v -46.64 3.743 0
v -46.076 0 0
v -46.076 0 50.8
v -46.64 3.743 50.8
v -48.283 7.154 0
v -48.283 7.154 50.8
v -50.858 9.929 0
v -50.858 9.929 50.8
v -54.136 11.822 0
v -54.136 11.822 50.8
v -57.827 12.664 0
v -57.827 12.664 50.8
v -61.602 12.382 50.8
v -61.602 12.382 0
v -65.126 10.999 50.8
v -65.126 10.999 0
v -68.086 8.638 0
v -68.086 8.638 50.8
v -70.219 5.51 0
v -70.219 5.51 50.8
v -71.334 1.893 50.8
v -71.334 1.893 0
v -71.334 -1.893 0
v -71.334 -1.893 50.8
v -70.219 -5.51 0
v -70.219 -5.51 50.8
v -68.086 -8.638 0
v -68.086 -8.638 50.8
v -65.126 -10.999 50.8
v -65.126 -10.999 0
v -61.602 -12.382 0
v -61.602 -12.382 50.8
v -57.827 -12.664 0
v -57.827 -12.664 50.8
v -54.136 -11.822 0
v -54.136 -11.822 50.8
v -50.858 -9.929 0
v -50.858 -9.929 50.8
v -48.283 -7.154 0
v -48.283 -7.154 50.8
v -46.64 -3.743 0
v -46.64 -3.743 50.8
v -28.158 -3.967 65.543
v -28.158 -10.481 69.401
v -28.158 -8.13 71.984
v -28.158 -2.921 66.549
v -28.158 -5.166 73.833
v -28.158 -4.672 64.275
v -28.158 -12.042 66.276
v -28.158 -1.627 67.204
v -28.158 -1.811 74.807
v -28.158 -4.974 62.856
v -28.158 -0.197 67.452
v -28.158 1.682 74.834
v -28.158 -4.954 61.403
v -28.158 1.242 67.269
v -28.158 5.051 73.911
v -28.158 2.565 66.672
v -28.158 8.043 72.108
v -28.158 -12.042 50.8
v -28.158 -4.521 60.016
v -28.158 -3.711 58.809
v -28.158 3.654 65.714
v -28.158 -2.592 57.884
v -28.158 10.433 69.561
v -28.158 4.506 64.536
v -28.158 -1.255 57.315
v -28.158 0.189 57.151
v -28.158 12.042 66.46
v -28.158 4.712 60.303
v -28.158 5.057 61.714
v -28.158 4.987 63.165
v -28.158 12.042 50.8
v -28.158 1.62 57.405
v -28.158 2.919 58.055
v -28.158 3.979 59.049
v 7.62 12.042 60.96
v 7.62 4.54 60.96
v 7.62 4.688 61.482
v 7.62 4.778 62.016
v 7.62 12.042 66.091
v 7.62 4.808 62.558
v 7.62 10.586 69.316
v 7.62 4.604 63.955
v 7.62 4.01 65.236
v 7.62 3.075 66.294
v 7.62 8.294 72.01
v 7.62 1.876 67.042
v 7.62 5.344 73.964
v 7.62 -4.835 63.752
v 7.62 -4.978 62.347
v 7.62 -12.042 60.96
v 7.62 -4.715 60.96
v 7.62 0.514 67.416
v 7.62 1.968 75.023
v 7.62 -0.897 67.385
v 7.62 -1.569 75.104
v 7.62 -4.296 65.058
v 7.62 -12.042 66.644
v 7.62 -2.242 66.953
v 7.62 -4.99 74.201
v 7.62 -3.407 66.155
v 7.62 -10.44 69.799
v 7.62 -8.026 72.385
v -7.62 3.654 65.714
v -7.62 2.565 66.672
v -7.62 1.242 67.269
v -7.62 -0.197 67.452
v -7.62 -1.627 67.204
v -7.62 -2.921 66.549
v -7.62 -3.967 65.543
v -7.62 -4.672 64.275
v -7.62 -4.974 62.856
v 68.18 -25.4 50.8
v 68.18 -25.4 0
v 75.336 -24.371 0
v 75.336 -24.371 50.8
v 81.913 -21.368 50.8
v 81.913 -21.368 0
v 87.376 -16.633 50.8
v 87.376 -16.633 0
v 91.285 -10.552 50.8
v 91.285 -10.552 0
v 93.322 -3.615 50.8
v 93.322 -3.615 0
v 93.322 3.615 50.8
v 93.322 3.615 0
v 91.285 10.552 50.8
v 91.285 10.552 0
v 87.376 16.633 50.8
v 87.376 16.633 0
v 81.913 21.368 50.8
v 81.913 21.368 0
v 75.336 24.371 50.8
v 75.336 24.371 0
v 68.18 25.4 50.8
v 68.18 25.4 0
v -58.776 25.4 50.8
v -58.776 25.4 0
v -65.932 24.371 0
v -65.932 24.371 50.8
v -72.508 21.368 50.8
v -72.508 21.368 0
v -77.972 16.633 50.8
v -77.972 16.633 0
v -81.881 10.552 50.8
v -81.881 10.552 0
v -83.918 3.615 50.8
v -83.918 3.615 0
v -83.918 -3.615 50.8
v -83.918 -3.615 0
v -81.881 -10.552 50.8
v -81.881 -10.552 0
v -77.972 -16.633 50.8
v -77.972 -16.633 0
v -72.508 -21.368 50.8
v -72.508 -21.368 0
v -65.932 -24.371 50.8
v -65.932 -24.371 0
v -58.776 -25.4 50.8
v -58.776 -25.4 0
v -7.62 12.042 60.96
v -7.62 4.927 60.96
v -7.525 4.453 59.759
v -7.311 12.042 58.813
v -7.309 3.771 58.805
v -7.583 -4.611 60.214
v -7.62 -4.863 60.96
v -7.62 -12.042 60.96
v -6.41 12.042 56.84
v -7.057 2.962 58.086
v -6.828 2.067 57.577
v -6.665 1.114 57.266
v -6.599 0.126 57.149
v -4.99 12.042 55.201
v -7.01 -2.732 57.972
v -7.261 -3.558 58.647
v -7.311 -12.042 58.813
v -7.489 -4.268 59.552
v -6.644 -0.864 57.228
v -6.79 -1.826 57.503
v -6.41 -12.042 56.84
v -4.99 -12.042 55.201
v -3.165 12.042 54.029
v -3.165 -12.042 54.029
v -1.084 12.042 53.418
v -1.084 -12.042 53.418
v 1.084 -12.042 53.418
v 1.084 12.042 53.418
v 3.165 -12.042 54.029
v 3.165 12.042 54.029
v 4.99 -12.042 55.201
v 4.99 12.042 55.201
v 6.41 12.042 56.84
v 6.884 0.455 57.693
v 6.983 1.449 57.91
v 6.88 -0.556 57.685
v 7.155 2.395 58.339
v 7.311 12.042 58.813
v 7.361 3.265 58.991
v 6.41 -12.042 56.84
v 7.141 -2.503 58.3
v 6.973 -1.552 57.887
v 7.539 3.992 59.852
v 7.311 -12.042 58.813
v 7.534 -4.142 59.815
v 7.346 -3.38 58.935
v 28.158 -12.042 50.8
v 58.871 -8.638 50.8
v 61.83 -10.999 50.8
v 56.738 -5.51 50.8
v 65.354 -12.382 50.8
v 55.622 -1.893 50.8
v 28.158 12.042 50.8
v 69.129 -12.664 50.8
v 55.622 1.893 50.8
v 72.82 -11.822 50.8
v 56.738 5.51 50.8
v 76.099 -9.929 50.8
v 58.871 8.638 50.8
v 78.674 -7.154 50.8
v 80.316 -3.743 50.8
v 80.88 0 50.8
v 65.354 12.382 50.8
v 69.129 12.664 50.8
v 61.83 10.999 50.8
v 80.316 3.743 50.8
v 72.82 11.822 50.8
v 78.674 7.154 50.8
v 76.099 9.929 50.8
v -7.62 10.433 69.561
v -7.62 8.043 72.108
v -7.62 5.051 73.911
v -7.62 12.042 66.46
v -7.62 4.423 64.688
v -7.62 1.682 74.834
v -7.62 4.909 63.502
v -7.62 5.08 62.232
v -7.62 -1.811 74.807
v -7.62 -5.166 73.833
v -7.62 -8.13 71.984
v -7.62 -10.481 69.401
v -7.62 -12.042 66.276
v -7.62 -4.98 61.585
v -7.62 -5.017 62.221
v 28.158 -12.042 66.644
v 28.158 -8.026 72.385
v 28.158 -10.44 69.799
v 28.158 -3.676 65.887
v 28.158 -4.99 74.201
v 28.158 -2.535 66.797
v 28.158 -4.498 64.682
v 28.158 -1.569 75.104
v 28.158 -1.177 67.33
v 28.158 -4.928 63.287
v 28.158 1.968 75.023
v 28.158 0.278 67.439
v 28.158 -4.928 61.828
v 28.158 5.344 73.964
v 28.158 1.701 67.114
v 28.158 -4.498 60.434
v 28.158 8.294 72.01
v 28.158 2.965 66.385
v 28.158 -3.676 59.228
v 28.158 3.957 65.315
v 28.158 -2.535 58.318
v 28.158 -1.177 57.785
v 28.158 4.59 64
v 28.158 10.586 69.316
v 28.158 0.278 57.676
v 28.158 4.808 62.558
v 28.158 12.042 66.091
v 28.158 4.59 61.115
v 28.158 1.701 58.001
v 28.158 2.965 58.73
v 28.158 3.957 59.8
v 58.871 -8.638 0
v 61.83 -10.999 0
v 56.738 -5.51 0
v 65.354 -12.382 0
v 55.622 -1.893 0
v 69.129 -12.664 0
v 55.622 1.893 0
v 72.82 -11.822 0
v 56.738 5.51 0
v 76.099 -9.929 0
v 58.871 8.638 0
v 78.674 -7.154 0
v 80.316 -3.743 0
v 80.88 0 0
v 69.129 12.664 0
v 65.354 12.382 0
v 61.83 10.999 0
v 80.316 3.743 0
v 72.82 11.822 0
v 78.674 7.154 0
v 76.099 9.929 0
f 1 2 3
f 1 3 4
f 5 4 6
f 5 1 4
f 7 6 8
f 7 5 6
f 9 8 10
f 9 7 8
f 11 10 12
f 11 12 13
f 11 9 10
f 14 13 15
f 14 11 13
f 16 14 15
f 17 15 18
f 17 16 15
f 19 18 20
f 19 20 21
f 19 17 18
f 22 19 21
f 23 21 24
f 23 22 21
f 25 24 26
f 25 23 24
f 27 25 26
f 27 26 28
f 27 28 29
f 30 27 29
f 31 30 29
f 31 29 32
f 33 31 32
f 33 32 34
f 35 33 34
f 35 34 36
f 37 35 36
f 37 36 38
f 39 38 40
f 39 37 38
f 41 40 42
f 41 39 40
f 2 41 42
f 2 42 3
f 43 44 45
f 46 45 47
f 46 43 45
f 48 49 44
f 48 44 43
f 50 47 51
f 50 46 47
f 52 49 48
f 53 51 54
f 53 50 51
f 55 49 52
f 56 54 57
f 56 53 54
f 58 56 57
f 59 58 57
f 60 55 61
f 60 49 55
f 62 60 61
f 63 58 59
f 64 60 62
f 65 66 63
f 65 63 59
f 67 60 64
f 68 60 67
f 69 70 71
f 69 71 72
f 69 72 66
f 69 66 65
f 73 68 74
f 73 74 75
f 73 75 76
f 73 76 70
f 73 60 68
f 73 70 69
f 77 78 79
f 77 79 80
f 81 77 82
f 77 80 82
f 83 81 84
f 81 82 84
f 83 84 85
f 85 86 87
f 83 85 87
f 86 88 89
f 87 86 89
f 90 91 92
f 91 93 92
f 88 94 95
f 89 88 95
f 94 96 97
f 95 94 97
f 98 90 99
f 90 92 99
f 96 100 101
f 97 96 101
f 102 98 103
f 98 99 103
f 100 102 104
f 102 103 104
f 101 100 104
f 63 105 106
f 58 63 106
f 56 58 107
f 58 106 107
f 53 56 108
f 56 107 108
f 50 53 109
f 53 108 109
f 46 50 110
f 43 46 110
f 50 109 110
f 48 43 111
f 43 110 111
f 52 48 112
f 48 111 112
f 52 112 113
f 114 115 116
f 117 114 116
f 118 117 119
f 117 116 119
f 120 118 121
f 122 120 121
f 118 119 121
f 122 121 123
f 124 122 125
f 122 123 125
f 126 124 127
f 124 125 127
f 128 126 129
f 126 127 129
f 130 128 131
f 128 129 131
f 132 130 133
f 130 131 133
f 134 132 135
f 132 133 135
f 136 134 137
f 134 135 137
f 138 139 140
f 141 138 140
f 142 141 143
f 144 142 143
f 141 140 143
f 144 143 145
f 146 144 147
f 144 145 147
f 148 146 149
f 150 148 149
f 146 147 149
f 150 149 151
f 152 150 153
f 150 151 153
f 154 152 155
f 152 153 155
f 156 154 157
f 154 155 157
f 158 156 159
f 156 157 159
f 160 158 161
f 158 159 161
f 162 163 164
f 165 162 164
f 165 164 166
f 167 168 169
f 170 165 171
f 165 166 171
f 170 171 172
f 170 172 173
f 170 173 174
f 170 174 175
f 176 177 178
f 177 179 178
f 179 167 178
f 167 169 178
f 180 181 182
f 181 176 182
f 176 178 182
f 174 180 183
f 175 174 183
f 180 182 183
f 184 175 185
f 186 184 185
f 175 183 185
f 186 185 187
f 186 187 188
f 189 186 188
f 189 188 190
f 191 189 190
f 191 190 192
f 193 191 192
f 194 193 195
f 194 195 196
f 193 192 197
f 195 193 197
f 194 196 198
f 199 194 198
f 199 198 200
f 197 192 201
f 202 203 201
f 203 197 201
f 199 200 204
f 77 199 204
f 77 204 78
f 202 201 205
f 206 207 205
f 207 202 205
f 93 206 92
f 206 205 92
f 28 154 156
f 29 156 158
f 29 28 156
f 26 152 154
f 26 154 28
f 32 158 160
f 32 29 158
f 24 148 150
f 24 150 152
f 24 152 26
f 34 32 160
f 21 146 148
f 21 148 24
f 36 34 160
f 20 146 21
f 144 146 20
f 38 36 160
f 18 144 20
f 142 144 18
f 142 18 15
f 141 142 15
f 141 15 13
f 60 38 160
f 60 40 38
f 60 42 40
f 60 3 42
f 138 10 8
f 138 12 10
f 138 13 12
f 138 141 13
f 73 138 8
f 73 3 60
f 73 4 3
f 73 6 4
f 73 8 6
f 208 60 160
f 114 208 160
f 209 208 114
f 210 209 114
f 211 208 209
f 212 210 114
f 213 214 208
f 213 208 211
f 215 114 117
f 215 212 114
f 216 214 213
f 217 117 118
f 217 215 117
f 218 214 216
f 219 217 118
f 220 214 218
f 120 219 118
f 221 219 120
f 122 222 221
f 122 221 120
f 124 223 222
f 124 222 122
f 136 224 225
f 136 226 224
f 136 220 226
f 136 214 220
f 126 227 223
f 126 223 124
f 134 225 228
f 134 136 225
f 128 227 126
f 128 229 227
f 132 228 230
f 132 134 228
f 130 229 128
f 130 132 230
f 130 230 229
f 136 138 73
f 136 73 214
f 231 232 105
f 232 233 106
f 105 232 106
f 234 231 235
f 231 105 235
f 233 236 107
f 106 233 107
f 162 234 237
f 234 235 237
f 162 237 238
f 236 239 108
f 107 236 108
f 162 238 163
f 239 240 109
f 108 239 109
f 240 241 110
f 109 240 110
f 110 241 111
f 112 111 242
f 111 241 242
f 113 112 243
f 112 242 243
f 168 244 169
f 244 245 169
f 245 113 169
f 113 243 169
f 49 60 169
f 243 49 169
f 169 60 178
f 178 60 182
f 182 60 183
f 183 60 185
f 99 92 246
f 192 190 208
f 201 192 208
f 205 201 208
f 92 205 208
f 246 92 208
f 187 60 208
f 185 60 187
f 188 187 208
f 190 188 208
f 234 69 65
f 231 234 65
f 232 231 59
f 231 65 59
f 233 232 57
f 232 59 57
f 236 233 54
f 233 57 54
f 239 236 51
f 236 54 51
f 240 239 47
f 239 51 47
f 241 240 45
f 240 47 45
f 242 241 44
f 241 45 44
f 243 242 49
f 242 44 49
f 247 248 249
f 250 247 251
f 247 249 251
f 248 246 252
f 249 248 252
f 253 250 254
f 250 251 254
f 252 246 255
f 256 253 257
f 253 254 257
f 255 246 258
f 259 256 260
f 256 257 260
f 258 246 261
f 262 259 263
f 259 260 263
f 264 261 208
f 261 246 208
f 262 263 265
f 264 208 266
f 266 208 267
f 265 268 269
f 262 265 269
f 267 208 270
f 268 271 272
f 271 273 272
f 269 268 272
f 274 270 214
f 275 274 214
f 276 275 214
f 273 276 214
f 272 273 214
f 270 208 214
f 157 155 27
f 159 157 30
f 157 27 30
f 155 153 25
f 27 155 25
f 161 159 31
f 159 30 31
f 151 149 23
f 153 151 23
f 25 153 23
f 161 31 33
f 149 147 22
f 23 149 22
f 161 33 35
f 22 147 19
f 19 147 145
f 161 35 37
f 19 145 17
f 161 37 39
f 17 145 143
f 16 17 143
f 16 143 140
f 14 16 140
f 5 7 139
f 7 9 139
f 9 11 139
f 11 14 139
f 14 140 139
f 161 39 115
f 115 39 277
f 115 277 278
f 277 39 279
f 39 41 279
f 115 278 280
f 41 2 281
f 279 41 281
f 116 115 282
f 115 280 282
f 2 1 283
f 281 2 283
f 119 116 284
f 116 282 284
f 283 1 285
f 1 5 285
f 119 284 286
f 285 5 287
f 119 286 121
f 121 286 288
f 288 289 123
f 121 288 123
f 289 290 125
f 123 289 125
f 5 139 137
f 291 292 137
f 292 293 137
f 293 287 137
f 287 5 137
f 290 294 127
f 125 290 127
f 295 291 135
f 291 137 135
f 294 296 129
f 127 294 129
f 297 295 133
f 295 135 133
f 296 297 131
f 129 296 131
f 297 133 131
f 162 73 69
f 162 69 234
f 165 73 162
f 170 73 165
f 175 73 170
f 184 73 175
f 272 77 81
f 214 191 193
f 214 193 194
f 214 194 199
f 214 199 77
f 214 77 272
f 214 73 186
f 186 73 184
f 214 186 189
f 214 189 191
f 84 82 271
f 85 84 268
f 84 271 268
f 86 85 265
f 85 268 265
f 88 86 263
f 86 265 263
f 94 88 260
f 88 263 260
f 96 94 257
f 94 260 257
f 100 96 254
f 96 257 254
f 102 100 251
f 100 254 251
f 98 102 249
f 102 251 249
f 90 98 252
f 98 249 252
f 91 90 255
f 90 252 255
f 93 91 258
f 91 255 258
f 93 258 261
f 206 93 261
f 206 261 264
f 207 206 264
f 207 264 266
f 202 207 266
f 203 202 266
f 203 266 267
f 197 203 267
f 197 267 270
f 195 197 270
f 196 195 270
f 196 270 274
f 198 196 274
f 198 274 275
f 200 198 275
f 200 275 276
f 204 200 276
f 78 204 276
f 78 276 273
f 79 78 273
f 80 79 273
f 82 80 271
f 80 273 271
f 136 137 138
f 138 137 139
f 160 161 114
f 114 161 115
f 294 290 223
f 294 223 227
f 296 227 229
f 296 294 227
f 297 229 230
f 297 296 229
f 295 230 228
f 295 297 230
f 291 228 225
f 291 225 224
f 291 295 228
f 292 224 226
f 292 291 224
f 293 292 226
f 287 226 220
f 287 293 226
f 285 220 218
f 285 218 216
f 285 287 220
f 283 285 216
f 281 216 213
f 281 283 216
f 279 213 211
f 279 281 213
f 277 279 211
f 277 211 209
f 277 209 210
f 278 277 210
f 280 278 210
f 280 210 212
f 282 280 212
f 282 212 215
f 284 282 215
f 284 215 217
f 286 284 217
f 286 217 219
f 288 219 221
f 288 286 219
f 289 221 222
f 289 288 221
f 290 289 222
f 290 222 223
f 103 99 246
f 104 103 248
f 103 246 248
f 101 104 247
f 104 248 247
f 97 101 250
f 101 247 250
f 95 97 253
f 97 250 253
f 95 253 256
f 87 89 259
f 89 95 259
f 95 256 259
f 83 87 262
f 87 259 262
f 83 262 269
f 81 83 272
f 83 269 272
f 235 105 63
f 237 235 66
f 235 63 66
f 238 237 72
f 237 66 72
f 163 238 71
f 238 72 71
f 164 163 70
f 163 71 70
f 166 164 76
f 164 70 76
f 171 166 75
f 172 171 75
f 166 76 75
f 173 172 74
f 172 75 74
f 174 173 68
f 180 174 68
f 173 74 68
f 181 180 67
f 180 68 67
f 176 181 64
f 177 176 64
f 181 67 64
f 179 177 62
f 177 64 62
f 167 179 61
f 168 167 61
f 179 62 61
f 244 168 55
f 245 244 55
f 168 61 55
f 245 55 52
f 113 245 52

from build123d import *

# Parameters (mm, degrees)
F0_R      = 12.7
F1_DEPTH  = 50.8
F2_W      = 56.316178
F2_H      = 24.083158
F3_DEPTH  = 25.4
F5_DEPTH  = 34.544
F8_DEPTH  = 25.4
F7_R      = 4.89521
F9_DEPTH  = 127
F6_R      = 5.04868
F10_DEPTH = 25.4


with BuildPart() as f1:
    # F0 (on Top) → F1 (new body)
    with BuildSketch(Plane.XY):
        with BuildLine():
            Line((68.180415, 25.4), (-58.776217, 25.4))
            ThreePointArc((-58.776217, 25.4), (-84.176217, 0), (-58.776217, -25.4))
            Line((-58.776217, -25.4), (68.180415, -25.4))
            ThreePointArc((68.180415, -25.4), (93.580415, 0), (68.180415, 25.4))
        make_face()
        with Locations((-58.776217, 0)):
            Circle(F0_R, mode=Mode.SUBTRACT)
        with Locations((68.180415, 0)):
            Circle(F0_R, mode=Mode.SUBTRACT)
    extrude(amount=F1_DEPTH)

    # F2 (on face) → F3 (join)
    with BuildSketch(Plane.XY.offset(50.8)):
        Rectangle(F2_W, F2_H)
    extrude(amount=F3_DEPTH)

    # F4 (on face) → F5 (cut)
    with BuildSketch(Plane.XZ.offset(12.041579)):
        with BuildLine():
            Line((-7.62, 76.2), (-7.62, 60.96))
            ThreePointArc((-7.62, 60.96), (0, 53.34), (7.62, 60.96))
            Line((7.62, 60.96), (7.62, 76.2))
            Line((7.62, 76.2), (-7.62, 76.2))
        make_face()
    extrude(amount=-F5_DEPTH, mode=Mode.SUBTRACT)

    # F7 (on face) → F8 (cut)
    with BuildSketch(Plane.YZ.offset(28.158089)):
        with BuildLine():
            ThreePointArc((-12.041579, 66.644274), (0.202546, 75.187594), (12.041579, 66.09121))
            Line((12.041579, 66.09121), (12.041579, 76.2))
            Line((12.041579, 76.2), (-12.041579, 76.2))
            Line((-12.041579, 76.2), (-12.041579, 66.644274))
        make_face()
    extrude(amount=-F8_DEPTH, mode=Mode.SUBTRACT)

    # F7 (on face) → F9 (cut)
    with BuildSketch(Plane.YZ.offset(28.158089)):
        with Locations((-0.087499, 62.557597)):
            Circle(F7_R)
    extrude(amount=-F9_DEPTH, mode=Mode.SUBTRACT)

    # F6 (on face) → F10 (cut)
    with BuildSketch(Plane(origin=(-28.158089, 0, 0), x_dir=(0, -1, 0), z_dir=(-1, 0, 0))):
        with BuildLine():
            ThreePointArc((-12.041579, 66.459917), (0.065622, 74.940473), (12.041579, 66.275567))
            Line((12.041579, 66.275567), (12.041579, 76.2))
            Line((12.041579, 76.2), (-12.041579, 76.2))
            Line((-12.041579, 76.2), (-12.041579, 66.459917))
        make_face()
        with Locations((-0.031925, 62.197081)):
            Circle(F6_R)
    extrude(amount=-F10_DEPTH, mode=Mode.SUBTRACT)


solid = f1.part
